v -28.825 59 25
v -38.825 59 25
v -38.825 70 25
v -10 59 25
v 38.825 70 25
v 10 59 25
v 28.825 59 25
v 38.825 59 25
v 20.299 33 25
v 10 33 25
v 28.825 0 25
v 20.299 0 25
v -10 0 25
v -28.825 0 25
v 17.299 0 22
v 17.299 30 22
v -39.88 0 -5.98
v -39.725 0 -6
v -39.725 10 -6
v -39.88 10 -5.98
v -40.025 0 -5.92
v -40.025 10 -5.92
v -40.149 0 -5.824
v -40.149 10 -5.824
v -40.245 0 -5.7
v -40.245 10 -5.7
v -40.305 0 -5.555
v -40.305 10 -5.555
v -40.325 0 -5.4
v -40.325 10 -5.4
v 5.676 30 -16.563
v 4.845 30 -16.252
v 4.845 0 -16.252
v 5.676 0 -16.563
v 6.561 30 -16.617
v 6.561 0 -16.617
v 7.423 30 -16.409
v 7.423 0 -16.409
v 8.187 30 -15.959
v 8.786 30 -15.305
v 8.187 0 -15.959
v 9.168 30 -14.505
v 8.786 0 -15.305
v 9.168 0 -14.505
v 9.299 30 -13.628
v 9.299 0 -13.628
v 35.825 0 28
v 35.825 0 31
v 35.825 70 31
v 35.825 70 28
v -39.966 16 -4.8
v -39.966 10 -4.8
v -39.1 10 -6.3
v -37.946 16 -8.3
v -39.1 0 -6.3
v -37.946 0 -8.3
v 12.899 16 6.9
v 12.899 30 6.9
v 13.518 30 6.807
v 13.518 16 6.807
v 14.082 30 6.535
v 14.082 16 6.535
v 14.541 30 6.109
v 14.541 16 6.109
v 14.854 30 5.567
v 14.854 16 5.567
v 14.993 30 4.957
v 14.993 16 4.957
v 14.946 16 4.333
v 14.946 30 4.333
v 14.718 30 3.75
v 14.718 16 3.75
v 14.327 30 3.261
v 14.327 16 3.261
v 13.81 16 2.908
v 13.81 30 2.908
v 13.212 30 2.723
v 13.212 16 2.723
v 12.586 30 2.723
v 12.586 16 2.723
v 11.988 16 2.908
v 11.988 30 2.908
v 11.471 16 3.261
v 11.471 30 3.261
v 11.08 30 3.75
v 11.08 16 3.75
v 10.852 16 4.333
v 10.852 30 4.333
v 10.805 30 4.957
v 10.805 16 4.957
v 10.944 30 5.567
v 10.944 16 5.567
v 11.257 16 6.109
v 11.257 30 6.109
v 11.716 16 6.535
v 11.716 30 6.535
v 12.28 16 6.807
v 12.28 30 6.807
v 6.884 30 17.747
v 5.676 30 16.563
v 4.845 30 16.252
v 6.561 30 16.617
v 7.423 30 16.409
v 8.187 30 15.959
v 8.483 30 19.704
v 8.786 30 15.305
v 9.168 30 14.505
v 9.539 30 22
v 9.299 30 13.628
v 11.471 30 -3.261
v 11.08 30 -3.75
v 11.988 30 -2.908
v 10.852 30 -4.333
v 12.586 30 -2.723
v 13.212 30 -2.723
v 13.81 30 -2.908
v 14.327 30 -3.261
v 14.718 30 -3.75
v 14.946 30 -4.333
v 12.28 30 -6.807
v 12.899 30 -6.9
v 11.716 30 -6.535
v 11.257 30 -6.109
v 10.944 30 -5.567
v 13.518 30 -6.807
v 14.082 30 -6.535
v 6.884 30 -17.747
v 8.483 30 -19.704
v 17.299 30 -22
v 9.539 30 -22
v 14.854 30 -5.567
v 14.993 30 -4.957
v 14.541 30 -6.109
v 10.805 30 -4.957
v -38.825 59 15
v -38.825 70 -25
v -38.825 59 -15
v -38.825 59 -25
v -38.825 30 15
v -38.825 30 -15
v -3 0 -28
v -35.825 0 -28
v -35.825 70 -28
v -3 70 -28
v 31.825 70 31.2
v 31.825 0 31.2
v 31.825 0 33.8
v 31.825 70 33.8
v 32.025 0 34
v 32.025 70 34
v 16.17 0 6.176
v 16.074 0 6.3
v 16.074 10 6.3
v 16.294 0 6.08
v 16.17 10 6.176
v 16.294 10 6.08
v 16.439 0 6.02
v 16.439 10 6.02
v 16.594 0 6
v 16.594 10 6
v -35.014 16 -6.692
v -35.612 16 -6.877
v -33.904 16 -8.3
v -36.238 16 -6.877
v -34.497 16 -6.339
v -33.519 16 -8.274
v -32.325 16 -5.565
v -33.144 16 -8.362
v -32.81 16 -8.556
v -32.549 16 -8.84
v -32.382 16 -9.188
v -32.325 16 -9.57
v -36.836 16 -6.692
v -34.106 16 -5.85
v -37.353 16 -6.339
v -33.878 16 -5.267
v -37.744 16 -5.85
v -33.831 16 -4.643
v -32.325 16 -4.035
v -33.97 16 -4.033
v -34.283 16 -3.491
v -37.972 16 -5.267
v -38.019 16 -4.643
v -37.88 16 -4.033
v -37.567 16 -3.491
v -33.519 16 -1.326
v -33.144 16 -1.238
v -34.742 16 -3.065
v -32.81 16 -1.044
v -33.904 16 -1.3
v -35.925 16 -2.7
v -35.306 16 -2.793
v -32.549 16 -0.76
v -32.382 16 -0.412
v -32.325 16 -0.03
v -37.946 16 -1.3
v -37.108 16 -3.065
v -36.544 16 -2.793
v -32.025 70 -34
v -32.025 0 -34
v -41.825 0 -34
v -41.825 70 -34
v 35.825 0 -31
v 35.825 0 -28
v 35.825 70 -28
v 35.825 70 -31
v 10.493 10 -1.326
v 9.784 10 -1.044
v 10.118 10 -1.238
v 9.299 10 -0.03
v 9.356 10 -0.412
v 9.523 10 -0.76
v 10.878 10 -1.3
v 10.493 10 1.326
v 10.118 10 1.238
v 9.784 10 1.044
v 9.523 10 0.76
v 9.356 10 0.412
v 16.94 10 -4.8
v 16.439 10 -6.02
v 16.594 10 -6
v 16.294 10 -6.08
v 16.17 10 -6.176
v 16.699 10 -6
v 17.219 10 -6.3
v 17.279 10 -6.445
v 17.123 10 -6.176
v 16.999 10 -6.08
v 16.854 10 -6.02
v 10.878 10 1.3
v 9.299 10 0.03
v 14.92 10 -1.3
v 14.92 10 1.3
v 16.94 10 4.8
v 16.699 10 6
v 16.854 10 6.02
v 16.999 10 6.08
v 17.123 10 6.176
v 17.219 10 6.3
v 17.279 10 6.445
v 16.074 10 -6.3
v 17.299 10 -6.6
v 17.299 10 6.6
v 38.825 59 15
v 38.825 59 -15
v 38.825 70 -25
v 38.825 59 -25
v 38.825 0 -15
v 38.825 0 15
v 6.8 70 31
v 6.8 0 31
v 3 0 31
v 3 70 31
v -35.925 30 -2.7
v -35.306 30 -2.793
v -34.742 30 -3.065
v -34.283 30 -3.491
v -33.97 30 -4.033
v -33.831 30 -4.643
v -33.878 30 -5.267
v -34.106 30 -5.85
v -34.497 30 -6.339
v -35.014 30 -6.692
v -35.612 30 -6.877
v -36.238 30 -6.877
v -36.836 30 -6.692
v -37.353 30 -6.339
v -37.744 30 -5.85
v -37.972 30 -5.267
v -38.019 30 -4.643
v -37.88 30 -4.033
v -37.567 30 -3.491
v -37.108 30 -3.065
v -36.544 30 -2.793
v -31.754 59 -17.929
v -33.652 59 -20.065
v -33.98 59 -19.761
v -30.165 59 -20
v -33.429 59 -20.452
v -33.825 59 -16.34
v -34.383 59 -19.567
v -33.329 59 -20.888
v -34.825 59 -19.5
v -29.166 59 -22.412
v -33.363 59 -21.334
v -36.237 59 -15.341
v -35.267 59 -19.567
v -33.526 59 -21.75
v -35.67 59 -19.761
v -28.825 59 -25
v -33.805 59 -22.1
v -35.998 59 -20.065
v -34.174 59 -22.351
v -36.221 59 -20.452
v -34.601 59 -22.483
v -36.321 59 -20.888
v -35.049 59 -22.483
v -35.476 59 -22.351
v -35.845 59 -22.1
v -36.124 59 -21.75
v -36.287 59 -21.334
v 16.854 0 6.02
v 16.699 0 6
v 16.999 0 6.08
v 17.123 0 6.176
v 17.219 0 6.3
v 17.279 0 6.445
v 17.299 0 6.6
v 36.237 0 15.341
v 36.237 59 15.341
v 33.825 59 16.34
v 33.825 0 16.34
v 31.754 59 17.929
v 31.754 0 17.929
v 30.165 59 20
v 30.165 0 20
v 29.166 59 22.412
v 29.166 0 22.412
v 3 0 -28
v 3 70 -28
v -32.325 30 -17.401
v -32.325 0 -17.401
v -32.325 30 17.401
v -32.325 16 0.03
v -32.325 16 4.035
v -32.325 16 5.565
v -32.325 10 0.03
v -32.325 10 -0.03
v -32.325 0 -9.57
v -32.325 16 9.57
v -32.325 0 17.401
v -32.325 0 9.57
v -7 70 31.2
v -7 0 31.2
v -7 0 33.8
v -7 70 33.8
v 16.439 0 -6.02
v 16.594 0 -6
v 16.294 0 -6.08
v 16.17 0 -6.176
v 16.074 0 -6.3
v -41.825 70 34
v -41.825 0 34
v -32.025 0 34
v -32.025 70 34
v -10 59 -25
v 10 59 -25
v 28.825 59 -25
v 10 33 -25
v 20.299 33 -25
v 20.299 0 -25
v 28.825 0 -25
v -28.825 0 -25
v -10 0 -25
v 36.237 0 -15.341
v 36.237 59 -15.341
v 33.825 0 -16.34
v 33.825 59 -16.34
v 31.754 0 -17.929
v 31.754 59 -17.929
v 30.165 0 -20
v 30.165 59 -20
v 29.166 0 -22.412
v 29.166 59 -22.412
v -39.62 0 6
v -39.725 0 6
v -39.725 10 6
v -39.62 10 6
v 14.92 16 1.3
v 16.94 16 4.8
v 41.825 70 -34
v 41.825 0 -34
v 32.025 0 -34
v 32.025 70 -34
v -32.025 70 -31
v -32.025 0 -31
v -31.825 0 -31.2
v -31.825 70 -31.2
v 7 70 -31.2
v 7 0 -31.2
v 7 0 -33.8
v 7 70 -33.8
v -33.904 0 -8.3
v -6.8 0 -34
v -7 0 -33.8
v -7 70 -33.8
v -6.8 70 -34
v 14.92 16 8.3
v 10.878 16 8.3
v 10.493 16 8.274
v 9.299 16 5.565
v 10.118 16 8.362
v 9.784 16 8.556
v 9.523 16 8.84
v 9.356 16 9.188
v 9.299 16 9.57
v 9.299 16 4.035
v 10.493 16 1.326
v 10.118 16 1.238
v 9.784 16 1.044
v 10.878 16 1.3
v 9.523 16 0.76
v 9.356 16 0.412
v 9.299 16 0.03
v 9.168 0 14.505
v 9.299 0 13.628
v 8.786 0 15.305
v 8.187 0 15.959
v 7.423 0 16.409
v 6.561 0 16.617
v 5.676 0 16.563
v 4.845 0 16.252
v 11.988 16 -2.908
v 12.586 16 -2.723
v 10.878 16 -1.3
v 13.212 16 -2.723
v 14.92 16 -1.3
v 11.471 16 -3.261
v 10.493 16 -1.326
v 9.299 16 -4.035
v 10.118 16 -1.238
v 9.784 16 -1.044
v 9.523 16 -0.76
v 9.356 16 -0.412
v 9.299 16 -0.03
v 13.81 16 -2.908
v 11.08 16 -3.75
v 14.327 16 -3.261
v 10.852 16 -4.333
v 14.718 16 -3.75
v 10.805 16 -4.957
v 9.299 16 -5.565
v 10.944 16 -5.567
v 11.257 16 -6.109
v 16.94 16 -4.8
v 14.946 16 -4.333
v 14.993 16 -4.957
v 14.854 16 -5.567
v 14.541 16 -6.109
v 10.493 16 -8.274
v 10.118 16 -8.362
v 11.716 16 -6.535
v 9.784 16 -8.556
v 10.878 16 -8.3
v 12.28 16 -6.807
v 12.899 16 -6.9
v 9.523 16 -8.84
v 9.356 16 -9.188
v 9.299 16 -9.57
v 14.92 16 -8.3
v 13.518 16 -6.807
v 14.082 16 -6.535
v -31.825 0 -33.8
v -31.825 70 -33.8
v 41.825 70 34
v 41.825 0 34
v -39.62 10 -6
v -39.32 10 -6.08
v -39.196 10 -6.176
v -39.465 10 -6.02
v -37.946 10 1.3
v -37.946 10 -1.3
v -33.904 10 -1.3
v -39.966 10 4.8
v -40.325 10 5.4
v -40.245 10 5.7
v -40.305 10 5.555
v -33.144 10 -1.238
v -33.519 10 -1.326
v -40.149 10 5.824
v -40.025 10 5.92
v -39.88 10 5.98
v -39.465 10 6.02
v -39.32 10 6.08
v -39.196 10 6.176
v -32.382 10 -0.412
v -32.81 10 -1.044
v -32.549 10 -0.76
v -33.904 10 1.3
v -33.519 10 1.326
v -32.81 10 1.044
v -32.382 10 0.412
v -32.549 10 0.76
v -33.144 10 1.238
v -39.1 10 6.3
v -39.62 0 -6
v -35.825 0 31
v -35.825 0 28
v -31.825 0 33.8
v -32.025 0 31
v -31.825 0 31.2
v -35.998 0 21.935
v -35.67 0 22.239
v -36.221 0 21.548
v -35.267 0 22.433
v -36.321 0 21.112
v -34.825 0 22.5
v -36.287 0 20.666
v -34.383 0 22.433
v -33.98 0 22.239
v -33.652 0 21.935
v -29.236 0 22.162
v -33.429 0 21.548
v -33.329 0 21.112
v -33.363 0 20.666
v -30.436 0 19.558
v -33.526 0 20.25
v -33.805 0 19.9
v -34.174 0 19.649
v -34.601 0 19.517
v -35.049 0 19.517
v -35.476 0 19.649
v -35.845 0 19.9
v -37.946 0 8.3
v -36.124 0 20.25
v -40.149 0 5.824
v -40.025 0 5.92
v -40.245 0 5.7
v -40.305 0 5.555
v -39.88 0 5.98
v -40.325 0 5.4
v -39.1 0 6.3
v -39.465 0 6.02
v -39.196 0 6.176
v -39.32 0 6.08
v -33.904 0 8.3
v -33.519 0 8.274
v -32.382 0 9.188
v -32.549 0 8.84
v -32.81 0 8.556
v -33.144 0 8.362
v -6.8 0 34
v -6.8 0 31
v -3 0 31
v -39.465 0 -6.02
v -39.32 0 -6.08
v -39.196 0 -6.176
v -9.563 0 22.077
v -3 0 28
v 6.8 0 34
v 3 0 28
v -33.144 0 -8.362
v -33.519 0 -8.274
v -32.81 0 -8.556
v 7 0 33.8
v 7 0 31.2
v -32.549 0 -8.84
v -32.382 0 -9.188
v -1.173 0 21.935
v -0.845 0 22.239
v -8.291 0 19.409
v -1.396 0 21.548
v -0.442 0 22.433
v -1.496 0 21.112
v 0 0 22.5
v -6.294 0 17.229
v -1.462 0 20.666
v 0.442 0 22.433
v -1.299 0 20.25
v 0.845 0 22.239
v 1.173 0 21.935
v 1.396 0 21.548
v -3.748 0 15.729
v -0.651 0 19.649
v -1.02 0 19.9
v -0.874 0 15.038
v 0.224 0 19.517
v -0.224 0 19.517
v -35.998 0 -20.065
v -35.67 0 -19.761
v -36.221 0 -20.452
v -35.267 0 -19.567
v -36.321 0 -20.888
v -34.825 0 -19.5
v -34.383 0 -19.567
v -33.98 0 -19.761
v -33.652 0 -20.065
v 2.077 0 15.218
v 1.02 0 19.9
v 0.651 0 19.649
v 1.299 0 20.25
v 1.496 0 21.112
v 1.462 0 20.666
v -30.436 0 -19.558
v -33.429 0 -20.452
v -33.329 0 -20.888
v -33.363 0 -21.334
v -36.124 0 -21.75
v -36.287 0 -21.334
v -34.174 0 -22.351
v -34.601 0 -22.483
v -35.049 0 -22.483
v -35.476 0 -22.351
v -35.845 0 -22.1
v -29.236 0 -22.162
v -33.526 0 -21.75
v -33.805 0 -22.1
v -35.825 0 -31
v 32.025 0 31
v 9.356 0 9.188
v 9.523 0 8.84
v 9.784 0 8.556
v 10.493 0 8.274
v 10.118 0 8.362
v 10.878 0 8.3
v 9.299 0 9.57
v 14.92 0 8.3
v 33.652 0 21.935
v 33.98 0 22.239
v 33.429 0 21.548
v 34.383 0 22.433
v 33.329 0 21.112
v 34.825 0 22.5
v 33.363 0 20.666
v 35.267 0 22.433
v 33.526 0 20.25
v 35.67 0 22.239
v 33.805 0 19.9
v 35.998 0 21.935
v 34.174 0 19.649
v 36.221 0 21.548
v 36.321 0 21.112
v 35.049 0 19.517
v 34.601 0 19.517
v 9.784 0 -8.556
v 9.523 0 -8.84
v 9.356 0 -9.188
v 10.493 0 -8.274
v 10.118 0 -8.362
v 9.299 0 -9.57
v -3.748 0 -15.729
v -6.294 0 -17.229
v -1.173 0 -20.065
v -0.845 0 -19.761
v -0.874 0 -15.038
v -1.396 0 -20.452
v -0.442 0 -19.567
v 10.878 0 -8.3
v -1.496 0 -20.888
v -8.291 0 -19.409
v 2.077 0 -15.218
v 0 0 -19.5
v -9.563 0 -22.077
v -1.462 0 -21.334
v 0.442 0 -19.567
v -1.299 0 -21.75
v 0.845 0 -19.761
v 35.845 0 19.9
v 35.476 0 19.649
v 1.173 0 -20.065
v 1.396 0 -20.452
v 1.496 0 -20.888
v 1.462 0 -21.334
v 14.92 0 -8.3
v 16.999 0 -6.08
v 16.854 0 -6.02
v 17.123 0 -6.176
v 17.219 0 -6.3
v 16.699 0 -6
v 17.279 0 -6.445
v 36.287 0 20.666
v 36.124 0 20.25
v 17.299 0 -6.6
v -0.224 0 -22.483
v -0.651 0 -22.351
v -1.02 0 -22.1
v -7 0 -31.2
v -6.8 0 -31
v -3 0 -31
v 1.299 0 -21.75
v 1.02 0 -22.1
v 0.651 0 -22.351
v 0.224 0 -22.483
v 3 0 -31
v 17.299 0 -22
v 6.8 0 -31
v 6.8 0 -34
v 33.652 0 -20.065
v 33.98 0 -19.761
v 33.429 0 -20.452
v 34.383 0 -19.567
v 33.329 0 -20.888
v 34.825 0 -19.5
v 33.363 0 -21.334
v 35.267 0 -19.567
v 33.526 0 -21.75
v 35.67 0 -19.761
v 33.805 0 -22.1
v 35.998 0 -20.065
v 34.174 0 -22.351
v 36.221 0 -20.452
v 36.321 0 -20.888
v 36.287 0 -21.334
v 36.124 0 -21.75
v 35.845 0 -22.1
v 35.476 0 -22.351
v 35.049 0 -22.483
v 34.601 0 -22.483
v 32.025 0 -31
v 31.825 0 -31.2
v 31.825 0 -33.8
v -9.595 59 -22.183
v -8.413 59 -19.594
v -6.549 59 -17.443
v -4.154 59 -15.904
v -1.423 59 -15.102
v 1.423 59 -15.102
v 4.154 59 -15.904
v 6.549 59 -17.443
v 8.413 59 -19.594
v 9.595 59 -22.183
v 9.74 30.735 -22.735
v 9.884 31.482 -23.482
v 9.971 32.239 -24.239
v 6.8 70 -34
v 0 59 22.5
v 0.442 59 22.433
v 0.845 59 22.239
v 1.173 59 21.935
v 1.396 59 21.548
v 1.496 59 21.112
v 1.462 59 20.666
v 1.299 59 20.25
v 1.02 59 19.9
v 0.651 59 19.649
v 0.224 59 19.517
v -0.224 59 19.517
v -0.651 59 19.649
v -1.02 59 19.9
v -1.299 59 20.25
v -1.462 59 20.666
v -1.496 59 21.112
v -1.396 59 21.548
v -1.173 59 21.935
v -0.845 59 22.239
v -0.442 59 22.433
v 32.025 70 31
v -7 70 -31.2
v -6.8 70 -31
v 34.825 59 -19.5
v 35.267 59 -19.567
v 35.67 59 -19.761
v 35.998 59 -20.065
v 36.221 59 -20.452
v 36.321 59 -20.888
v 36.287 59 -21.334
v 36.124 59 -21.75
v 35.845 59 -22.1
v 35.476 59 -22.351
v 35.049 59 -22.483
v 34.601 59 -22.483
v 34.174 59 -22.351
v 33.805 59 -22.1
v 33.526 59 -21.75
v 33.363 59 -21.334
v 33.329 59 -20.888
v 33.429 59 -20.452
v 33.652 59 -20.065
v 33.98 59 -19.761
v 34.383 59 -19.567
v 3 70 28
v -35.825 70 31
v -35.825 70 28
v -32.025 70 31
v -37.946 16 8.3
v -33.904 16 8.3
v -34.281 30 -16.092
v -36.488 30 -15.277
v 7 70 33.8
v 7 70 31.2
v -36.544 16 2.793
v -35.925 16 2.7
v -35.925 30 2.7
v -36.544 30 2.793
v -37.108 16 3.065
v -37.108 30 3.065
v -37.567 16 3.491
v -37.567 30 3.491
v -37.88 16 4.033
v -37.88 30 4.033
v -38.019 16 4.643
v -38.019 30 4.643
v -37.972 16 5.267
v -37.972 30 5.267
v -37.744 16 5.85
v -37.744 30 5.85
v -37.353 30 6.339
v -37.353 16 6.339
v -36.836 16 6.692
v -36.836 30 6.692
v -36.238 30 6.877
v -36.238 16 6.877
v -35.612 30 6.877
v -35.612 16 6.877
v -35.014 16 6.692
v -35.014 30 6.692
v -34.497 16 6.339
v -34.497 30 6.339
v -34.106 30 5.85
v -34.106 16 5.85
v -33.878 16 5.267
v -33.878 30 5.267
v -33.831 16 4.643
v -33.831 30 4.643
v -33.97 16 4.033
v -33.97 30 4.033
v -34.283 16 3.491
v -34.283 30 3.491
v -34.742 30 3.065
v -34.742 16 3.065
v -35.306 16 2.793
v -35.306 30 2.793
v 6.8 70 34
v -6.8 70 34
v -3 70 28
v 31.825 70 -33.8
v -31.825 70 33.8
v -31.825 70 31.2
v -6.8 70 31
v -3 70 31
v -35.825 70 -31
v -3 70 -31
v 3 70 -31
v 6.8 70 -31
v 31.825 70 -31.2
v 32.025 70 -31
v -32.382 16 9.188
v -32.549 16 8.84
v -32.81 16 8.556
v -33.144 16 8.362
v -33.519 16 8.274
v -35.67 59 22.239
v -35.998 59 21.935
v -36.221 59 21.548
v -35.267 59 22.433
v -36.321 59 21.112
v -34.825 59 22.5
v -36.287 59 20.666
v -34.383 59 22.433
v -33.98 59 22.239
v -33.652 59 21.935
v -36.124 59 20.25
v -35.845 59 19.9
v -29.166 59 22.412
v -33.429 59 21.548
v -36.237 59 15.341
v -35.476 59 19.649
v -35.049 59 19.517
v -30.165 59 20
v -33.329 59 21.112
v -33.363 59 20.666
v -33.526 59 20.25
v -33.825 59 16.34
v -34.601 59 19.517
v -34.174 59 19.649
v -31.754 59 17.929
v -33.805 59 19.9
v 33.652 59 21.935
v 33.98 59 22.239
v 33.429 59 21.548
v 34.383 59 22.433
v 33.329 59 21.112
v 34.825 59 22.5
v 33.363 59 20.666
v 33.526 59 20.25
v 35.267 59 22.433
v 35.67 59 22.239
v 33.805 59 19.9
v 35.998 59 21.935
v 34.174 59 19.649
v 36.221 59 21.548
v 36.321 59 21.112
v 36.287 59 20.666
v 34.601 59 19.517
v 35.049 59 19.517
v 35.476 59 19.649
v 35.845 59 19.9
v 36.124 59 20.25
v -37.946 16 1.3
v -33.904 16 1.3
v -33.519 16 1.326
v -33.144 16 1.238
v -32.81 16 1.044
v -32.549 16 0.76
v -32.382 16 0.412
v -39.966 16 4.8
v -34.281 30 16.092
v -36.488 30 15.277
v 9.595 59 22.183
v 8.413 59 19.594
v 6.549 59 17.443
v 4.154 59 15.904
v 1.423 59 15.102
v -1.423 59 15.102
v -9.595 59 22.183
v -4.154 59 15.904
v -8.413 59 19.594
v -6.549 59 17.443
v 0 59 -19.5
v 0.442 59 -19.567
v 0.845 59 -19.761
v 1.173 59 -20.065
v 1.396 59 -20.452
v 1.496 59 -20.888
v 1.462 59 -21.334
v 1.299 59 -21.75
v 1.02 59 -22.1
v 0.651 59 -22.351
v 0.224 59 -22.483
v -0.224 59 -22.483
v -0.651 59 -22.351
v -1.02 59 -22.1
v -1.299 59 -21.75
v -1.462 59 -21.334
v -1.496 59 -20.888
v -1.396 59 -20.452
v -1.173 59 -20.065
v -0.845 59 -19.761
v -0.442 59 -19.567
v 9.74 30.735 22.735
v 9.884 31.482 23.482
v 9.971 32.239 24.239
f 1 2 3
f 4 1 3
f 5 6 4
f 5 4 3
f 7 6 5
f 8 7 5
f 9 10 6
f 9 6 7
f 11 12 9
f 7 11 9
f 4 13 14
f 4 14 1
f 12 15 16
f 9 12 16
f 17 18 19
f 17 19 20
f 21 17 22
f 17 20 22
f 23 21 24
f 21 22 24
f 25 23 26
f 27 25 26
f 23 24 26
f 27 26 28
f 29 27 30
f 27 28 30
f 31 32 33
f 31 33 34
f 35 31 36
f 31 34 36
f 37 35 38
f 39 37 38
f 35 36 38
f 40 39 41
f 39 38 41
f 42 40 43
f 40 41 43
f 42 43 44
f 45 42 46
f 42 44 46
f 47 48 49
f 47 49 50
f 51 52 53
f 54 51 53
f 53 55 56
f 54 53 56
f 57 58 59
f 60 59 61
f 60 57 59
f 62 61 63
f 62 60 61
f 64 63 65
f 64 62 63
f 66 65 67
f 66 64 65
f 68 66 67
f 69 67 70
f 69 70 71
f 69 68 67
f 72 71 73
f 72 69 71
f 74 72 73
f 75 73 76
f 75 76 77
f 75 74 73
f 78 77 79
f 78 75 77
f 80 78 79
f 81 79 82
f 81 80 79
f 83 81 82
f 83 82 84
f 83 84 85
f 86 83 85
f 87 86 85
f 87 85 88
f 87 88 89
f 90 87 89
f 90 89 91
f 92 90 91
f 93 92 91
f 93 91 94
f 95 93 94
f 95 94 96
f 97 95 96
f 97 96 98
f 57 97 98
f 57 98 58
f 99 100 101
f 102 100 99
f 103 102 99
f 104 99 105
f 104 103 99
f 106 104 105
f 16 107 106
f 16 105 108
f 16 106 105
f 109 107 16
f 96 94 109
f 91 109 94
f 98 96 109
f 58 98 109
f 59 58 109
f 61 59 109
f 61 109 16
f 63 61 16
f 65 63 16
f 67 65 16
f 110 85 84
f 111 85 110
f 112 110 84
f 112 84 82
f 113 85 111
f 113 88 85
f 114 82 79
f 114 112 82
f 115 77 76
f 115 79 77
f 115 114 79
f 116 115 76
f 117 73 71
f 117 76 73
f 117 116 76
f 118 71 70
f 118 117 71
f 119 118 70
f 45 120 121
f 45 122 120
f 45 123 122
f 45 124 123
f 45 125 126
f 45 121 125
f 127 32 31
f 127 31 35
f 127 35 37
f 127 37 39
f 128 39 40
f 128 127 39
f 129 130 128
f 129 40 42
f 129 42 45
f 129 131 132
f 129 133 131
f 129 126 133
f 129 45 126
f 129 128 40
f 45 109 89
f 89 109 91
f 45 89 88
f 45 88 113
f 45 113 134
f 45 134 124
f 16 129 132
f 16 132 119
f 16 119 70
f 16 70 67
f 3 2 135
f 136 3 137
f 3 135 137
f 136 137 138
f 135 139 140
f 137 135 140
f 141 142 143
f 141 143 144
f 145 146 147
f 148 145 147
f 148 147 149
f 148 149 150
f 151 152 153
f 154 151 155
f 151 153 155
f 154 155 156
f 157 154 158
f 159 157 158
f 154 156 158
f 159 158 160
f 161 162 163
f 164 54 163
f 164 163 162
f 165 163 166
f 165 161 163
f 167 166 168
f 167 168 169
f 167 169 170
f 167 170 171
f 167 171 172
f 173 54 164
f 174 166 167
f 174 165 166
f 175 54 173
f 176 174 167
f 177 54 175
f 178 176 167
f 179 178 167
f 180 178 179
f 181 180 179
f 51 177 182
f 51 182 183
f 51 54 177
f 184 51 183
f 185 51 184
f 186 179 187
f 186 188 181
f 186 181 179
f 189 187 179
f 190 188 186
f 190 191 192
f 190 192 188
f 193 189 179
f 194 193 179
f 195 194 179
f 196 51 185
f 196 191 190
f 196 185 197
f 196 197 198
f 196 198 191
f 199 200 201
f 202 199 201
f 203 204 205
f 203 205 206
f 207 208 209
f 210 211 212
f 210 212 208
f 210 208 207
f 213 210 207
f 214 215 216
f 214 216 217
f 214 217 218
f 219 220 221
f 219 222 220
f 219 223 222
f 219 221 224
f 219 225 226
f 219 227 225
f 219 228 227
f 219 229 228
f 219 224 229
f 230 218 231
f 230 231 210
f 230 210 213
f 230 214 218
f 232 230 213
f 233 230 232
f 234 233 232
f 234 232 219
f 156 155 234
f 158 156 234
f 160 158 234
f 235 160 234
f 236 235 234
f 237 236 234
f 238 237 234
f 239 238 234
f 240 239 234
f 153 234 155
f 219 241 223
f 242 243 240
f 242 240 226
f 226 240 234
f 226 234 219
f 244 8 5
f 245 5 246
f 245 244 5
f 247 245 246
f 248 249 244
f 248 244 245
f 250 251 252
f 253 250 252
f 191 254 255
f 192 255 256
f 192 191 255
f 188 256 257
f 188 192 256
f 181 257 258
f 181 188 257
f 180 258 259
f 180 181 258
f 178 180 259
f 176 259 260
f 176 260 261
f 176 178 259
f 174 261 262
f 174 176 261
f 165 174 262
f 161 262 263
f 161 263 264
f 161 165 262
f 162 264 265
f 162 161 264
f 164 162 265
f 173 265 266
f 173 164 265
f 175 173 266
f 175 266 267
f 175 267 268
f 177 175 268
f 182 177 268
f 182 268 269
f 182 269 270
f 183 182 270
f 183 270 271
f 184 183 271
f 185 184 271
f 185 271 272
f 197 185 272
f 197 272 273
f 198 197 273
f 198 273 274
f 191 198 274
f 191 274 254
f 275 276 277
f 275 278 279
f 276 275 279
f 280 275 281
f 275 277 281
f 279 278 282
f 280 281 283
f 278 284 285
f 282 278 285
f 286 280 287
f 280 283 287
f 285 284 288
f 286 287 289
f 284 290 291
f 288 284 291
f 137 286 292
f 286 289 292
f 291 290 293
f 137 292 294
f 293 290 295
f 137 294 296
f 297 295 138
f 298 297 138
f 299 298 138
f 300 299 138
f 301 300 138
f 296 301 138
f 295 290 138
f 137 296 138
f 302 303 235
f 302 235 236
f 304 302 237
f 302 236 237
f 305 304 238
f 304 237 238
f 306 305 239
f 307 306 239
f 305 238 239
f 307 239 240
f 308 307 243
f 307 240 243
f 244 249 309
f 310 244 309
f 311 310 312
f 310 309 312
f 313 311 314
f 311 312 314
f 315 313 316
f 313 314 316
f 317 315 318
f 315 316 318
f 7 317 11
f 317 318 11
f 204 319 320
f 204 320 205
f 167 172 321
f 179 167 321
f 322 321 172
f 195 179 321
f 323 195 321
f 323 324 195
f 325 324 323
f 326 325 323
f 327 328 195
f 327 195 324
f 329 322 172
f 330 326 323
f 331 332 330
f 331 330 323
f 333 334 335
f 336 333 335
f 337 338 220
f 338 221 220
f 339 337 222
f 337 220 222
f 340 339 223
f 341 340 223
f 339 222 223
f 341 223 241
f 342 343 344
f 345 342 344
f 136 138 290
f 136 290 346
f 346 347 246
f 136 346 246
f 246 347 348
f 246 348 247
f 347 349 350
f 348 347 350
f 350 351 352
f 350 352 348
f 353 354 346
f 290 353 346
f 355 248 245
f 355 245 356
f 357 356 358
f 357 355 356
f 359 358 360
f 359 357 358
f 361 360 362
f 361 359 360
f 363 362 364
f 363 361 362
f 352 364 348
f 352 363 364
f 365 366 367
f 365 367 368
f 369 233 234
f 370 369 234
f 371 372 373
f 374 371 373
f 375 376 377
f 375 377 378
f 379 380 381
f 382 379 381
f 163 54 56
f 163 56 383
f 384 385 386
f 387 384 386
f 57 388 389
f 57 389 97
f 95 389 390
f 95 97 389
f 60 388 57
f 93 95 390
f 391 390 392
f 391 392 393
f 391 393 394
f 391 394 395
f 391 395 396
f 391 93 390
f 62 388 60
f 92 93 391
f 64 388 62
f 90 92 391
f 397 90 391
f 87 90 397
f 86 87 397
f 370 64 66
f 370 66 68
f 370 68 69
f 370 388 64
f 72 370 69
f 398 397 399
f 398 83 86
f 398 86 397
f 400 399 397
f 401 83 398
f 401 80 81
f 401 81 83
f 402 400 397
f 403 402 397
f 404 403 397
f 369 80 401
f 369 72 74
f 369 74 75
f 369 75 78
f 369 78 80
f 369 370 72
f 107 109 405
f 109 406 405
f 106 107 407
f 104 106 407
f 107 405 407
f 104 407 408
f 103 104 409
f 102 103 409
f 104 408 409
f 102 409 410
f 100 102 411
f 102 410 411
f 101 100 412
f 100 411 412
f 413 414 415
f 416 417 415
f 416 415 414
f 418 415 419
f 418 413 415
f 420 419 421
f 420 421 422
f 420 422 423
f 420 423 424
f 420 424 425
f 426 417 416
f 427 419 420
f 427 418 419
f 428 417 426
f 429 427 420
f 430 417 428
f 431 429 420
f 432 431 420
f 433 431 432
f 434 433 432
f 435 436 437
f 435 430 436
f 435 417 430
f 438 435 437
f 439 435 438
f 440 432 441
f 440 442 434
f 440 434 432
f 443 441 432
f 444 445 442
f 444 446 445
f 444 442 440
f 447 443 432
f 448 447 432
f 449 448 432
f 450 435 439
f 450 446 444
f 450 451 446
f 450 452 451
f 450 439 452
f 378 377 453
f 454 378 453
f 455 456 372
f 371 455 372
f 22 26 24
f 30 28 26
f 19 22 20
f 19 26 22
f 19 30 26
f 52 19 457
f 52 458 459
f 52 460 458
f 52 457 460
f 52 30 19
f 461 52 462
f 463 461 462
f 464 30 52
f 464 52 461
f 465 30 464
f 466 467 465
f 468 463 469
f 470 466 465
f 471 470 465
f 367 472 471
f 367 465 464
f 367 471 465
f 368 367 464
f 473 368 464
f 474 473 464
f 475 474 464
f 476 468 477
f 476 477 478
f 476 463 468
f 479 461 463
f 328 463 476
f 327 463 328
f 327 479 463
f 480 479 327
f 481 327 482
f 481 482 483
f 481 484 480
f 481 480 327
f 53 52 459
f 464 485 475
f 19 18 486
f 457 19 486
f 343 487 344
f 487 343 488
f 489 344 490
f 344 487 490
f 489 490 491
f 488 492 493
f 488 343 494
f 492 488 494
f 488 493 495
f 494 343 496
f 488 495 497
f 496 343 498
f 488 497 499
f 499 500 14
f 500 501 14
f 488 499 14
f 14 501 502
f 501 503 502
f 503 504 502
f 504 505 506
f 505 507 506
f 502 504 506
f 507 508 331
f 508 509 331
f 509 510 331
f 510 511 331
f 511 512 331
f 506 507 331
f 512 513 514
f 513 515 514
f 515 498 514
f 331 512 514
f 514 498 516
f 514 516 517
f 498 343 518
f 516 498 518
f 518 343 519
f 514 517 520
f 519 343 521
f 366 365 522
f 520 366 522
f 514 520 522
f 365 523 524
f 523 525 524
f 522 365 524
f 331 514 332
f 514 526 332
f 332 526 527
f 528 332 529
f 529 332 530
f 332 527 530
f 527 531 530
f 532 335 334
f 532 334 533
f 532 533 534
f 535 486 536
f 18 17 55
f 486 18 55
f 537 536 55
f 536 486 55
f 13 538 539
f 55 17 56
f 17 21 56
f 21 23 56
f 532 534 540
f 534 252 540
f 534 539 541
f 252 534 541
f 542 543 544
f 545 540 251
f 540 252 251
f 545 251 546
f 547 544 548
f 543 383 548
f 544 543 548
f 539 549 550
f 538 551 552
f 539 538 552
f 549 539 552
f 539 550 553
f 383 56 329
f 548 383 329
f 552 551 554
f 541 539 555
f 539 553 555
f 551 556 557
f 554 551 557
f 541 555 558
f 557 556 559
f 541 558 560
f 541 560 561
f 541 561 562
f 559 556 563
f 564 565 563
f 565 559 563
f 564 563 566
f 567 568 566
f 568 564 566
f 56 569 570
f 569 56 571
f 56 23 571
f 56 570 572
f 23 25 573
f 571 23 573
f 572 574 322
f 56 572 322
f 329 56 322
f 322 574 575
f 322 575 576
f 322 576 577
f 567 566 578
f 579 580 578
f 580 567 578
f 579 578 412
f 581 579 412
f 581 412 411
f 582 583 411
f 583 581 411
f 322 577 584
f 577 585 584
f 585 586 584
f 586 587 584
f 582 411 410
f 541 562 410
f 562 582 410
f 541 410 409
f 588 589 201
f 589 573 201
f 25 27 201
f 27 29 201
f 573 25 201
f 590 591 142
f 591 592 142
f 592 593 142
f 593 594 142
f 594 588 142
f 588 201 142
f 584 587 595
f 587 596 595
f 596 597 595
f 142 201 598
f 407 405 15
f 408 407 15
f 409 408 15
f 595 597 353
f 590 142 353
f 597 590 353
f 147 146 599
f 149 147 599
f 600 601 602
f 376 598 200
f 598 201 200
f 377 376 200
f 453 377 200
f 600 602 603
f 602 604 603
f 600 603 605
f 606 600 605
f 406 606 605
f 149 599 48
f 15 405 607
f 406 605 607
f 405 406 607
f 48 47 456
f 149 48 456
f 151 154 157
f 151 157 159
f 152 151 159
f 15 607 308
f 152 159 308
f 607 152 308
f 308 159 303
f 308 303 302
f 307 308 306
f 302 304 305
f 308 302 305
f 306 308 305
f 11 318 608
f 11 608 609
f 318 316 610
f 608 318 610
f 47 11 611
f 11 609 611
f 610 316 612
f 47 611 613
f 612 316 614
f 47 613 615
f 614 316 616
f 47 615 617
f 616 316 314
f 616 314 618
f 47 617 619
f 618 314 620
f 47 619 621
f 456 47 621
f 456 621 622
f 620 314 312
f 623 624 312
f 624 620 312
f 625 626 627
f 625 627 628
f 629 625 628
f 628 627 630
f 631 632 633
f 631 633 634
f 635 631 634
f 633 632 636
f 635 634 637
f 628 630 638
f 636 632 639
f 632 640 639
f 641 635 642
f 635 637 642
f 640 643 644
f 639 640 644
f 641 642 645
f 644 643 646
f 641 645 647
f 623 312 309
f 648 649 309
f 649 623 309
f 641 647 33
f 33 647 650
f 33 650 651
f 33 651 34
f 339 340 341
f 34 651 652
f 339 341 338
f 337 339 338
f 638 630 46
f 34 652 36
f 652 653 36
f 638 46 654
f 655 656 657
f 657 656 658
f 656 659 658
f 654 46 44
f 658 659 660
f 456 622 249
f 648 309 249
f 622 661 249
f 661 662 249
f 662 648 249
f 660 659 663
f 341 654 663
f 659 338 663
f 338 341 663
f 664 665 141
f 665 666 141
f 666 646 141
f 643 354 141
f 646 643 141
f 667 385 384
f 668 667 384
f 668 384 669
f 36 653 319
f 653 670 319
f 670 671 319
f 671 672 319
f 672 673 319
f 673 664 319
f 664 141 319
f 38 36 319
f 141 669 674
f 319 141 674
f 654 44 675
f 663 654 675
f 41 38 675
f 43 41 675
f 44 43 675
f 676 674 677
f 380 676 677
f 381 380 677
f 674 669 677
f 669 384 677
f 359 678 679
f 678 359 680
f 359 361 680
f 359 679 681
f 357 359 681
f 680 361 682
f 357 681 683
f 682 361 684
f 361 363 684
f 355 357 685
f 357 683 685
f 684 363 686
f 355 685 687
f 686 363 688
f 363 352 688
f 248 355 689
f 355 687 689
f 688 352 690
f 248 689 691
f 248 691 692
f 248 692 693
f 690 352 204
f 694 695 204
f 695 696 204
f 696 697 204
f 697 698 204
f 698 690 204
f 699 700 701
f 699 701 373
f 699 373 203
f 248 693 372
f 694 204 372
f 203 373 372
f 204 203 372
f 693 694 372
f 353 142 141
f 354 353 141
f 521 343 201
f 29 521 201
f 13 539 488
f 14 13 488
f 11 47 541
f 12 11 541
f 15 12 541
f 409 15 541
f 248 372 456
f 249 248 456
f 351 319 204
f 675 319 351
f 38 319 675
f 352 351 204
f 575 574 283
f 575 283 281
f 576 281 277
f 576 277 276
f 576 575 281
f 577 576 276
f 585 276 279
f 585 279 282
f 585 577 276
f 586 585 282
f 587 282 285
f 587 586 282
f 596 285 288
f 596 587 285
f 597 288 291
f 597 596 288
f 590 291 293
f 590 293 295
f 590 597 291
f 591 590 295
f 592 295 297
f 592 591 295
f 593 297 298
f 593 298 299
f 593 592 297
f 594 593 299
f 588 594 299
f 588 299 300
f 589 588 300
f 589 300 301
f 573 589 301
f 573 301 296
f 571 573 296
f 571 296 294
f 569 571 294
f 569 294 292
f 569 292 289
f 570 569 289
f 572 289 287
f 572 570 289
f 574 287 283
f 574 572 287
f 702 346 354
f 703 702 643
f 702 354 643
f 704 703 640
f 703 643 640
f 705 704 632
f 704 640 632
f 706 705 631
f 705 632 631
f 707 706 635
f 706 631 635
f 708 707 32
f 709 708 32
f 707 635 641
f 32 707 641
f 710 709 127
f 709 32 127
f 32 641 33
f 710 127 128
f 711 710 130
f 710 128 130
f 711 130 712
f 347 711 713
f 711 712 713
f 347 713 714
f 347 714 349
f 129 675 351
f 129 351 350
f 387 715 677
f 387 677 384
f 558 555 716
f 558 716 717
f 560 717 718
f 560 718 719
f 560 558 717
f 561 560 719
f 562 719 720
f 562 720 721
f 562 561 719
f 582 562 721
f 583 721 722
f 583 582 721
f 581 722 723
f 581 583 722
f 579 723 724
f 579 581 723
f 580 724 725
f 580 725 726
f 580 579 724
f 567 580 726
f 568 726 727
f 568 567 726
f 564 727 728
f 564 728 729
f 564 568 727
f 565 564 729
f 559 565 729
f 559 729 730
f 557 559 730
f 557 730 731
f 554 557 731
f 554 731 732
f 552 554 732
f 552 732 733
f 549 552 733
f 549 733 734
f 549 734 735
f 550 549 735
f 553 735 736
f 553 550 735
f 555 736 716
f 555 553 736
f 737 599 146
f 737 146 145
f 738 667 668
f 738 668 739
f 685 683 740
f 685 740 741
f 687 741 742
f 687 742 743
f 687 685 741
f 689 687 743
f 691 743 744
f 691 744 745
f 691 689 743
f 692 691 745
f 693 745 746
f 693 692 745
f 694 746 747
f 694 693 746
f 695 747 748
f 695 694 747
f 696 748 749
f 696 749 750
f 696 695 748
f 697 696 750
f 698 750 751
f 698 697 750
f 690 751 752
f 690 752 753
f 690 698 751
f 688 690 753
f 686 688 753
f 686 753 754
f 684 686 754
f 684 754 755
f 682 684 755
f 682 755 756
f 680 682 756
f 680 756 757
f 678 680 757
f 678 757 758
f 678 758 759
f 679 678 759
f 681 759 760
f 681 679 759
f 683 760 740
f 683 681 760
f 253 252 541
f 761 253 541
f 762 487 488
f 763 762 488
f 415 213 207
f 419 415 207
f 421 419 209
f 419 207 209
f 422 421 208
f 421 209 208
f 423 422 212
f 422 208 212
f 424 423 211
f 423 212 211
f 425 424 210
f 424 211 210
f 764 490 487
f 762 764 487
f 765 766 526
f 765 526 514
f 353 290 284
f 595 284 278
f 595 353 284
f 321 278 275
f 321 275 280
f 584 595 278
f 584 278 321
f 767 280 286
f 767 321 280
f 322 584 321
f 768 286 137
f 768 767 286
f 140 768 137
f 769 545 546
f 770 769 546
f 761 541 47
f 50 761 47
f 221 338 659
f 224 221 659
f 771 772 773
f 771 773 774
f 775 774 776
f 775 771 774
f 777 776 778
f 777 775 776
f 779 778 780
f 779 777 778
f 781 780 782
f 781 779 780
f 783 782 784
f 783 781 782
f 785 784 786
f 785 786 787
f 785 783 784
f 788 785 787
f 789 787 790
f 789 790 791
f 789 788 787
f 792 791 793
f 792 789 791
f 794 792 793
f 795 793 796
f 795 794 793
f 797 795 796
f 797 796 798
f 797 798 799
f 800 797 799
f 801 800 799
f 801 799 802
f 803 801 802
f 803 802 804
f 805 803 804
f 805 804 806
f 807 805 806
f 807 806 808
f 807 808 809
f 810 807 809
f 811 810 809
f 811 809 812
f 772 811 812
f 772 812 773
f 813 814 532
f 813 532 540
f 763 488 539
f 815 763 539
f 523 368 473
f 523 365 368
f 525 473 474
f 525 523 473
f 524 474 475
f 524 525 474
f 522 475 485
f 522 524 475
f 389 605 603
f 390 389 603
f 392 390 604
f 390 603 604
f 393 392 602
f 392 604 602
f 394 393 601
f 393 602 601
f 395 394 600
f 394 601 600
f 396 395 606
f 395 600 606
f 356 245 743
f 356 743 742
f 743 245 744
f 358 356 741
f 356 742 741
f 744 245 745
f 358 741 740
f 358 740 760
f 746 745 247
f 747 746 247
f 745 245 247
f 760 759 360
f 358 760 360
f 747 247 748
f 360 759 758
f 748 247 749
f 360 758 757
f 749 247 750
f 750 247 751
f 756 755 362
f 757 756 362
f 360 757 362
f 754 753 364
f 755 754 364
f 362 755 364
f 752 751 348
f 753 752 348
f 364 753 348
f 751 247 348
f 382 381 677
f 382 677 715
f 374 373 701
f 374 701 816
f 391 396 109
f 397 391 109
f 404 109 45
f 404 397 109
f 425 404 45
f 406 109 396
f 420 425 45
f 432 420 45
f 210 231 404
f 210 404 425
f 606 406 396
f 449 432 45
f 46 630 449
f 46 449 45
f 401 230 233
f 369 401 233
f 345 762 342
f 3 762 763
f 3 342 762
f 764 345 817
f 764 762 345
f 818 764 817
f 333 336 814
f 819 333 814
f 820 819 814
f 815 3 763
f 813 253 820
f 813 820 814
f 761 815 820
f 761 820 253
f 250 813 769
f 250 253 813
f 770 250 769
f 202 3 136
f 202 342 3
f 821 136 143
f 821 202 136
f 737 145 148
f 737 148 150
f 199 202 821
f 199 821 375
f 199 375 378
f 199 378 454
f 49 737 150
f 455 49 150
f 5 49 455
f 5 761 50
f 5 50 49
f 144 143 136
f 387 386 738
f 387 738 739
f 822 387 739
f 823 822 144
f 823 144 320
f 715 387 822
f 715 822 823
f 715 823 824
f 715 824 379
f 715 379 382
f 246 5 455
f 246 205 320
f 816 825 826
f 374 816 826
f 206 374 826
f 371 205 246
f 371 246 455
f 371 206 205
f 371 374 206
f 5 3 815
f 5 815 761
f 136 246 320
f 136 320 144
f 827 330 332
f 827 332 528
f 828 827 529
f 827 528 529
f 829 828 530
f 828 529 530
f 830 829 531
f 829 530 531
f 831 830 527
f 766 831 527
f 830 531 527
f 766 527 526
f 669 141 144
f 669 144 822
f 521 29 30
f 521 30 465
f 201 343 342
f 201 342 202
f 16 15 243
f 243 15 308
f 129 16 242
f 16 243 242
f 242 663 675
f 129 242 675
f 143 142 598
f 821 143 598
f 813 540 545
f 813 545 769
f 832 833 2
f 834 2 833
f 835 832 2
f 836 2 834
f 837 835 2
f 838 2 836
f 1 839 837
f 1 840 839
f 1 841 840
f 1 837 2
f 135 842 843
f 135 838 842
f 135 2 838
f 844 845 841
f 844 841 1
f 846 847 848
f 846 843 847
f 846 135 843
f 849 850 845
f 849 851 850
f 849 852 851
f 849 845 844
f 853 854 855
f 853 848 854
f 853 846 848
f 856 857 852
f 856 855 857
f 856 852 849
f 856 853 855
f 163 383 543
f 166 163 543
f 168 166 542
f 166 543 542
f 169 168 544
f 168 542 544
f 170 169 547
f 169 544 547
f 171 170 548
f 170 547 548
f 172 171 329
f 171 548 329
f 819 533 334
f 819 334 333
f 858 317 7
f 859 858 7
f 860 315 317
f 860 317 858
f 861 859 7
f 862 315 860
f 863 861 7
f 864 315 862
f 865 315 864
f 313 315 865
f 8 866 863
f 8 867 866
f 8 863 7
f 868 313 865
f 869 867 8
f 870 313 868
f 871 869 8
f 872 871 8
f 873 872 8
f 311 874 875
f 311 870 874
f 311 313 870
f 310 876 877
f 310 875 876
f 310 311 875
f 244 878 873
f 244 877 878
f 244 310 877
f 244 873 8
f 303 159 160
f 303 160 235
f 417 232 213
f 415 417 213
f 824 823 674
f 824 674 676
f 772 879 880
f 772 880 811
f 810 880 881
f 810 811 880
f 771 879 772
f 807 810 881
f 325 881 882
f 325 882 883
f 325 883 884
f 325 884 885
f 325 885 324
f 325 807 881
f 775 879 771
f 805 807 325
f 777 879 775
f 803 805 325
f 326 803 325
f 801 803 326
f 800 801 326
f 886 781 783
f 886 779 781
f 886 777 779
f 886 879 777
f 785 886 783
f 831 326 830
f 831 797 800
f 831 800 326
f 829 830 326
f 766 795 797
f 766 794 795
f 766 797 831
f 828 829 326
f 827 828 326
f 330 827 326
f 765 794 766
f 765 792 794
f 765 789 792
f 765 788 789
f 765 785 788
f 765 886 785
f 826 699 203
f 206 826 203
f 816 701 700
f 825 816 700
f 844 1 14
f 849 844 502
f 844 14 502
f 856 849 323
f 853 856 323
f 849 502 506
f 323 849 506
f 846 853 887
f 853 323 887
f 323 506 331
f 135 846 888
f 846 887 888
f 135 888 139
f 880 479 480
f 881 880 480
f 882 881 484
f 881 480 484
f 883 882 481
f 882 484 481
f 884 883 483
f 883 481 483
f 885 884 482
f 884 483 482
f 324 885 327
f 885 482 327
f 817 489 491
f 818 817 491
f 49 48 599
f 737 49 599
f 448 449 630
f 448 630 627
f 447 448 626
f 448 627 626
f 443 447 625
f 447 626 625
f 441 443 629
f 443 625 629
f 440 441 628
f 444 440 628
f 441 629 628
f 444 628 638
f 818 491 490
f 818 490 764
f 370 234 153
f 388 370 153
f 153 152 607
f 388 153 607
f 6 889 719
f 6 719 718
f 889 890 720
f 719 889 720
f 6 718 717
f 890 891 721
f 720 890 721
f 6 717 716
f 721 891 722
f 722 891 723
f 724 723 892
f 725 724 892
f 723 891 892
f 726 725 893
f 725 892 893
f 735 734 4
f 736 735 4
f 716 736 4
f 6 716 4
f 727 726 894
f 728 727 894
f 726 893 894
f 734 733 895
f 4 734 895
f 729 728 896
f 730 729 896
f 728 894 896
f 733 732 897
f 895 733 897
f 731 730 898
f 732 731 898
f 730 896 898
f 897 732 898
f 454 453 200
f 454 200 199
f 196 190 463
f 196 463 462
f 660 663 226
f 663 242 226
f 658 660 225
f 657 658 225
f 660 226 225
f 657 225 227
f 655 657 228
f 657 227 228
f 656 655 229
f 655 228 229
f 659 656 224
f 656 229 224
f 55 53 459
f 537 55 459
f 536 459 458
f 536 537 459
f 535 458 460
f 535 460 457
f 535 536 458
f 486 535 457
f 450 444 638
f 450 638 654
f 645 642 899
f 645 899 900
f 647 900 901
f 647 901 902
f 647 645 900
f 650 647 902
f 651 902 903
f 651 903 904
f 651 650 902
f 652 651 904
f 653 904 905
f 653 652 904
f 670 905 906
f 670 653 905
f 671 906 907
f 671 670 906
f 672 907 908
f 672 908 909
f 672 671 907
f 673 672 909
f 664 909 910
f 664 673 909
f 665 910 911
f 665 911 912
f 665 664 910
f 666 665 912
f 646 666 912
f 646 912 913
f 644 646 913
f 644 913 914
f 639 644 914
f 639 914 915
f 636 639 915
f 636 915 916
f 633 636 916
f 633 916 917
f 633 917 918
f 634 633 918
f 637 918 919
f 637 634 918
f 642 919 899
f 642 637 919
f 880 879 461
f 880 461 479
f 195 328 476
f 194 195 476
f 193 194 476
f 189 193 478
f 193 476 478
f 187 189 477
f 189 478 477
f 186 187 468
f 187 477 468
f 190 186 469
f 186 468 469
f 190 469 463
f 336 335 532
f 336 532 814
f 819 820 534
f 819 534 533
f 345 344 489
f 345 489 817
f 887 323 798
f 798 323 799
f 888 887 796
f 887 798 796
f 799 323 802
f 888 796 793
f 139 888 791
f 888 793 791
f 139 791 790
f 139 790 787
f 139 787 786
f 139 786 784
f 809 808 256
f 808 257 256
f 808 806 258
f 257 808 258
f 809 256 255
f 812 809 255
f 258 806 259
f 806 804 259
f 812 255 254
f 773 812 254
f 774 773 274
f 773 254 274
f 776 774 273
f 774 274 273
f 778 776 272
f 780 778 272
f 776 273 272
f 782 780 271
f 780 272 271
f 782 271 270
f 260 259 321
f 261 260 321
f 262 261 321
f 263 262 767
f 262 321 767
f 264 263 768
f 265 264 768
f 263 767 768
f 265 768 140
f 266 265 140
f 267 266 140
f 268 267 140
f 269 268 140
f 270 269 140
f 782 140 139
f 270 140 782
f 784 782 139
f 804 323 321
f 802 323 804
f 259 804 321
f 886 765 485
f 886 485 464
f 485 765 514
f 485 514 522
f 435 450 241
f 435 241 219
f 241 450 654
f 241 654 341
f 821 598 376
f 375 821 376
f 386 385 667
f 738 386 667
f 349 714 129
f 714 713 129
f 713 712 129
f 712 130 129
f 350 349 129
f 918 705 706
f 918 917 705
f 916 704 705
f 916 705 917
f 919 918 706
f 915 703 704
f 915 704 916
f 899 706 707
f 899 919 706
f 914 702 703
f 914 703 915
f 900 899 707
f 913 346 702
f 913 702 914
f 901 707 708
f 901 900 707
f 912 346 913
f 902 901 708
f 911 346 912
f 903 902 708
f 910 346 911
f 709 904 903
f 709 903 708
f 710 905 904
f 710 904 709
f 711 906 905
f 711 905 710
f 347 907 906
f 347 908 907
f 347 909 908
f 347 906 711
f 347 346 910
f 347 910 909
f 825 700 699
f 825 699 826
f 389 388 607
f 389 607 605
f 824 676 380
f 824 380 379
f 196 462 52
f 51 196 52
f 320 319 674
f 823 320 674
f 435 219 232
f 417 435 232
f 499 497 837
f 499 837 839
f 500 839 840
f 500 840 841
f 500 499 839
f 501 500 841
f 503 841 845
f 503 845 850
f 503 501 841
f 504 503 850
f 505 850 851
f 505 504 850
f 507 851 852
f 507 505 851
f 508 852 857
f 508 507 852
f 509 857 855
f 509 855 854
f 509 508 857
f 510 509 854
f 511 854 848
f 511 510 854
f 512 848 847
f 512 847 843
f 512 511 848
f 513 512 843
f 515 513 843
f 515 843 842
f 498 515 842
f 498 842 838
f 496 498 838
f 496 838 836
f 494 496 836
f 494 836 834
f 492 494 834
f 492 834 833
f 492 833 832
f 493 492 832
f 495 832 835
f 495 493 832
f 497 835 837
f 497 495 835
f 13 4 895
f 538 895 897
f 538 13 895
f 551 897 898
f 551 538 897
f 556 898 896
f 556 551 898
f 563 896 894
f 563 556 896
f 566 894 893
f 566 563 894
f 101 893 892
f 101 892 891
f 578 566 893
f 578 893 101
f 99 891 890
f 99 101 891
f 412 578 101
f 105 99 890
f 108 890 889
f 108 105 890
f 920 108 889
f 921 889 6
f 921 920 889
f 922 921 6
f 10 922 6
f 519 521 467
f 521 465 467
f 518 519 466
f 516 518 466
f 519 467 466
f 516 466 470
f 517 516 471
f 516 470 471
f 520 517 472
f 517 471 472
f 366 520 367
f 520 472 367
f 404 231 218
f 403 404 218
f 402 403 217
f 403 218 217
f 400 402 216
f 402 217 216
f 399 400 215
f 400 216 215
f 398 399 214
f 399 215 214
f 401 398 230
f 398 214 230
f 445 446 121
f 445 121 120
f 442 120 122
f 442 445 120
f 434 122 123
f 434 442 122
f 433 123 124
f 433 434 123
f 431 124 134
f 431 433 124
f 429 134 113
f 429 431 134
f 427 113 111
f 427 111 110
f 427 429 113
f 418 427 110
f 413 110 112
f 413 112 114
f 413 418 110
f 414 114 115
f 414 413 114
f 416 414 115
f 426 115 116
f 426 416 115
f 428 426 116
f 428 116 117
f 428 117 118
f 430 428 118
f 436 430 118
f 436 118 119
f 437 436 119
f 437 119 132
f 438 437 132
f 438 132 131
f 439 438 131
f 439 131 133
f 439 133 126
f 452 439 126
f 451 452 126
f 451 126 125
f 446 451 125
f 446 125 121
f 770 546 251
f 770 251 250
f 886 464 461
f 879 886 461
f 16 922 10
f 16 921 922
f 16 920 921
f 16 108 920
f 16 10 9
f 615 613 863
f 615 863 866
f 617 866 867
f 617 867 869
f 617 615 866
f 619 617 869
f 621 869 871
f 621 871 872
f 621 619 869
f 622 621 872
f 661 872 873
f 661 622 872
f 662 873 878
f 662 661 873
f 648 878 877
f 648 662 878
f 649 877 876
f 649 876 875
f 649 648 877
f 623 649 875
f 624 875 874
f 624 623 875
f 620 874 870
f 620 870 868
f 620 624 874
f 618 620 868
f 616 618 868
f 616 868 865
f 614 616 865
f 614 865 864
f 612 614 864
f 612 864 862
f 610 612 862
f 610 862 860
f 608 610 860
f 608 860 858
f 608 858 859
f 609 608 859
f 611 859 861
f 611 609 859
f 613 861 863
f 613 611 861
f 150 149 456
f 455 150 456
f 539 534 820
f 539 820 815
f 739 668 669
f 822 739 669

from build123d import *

# Parameters (mm, degrees)
SKETCH1_R             = 1.5
BOSS_EXTRUDE6_DEPTH   = 59
BOSS_EXTRUDE6_2_DEPTH = 59
BOSS_EXTRUDE6_3_DEPTH = 59
BOSS_EXTRUDE6_4_DEPTH = 59
BOSS_EXTRUDE6_5_DEPTH = 59
BOSS_EXTRUDE6_6_DEPTH = 59
SKETCH2_W             = 83.65
SKETCH2_H             = 56
SKETCH2_W_2           = 77.65
SKETCH2_H_2           = 50
BOSS_EXTRUDE7_DEPTH   = 70
SKETCH3_R             = 2.1
SKETCH3_W             = 8
SKETCH3_H             = 50
BOSS_EXTRUDE8_DEPTH   = 30
CHAMFER1_SIZE         = 3
FILLET1_R             = 3
SKETCH4_R             = 2.1
CUT_EXTRUDE2_DEPTH    = 16
FILLET2_R             = 1.3
SKETCH5_W             = 8.8
SKETCH5_H             = 12
CUT_EXTRUDE3_DEPTH    = 10
FILLET3_R             = 0.6
SKETCH6_W             = 6
SKETCH6_H             = 6
BOSS_EXTRUDE9_DEPTH   = 70
CHAMFER3_SIZE         = 0.2


with BuildPart() as part:
    # Sketch1 → Boss-Extrude6 (new body)
    with BuildSketch(Plane(origin=(0, 0, 0), x_dir=(1, 0, 0), z_dir=(0, 1, 0))):
        with BuildLine():
            Line((-38.825, 15), (-38.825, 25))
            Line((-38.825, 25), (-28.825, 25))
            ThreePointArc((-28.825, 25), (-31.753932188, 17.928932188), (-38.825, 15))
        make_face()
        with Locations(Location((-34.825, 21, 0), (0, 0, 270))):
            Circle(SKETCH1_R, mode=Mode.SUBTRACT)
    extrude(amount=BOSS_EXTRUDE6_DEPTH)



with BuildPart() as body_2:
    # Sketch1 → Boss-Extrude6 2 (new body)
    with BuildSketch(Plane(origin=(0, 0, 0), x_dir=(1, 0, 0), z_dir=(0, 1, 0))):
        with BuildLine():
            Line((-38.825, -25), (-28.825, -25))
            ThreePointArc((-28.825, -25), (-31.753932188, -17.928932188), (-38.825, -15))
            Line((-38.825, -15), (-38.825, -25))
        make_face()
        with Locations(Location((-34.825, -21, 0), (0, 0, 270))):
            Circle(SKETCH1_R, mode=Mode.SUBTRACT)
    extrude(amount=BOSS_EXTRUDE6_2_DEPTH)


with BuildPart() as body_3:
    # Sketch1 → Boss-Extrude6 3 (new body)
    with BuildSketch(Plane(origin=(0, 0, 0), x_dir=(1, 0, 0), z_dir=(0, 1, 0))):
        with BuildLine():
            Line((38.825, -25), (38.825, -15))
            ThreePointArc((38.825, -15), (31.753932188, -17.928932188), (28.825, -25))
            Line((28.825, -25), (38.825, -25))
        make_face()
        with Locations(Location((34.825, -21, 0), (0, 0, 270))):
            Circle(SKETCH1_R, mode=Mode.SUBTRACT)
    extrude(amount=BOSS_EXTRUDE6_3_DEPTH)


with BuildPart() as body_4:
    # Sketch1 → Boss-Extrude6 4 (new body)
    with BuildSketch(Plane(origin=(0, 0, 0), x_dir=(1, 0, 0), z_dir=(0, 1, 0))):
        with BuildLine():
            Line((28.825, 25), (38.825, 25))
            Line((38.825, 25), (38.825, 15))
            ThreePointArc((38.825, 15), (31.753932188, 17.928932188), (28.825, 25))
        make_face()
        with Locations(Location((34.825, 21, 0), (0, 0, 270))):
            Circle(SKETCH1_R, mode=Mode.SUBTRACT)
    extrude(amount=BOSS_EXTRUDE6_4_DEPTH)


with BuildPart() as body_5:
    # Sketch1 → Boss-Extrude6 5 (new body)
    with BuildSketch(Plane(origin=(0, 0, 0), x_dir=(1, 0, 0), z_dir=(0, 1, 0))):
        with BuildLine():
            Line((10, -25), (-10, -25))
            ThreePointArc((-10, -25), (0, -15), (10, -25))
        make_face()
        with Locations(Location((0, -21, 0), (0, 0, 270))):
            Circle(SKETCH1_R, mode=Mode.SUBTRACT)
    extrude(amount=BOSS_EXTRUDE6_5_DEPTH)


with BuildPart() as body_6:
    # Sketch1 → Boss-Extrude6 6 (new body)
    with BuildSketch(Plane(origin=(0, 0, 0), x_dir=(1, 0, 0), z_dir=(0, 1, 0))):
        with BuildLine():
            Line((10, 25), (-10, 25))
            ThreePointArc((-10, 25), (0, 15), (10, 25))
        make_face()
        with Locations(Location((0, 21, 0), (0, 0, 270))):
            Circle(SKETCH1_R, mode=Mode.SUBTRACT)
    extrude(amount=BOSS_EXTRUDE6_6_DEPTH)


with BuildPart() as part_1:
    add(part.part)

    add(body_2.part)  # Boss-Extrude7 merges body 2

    add(body_3.part)  # Boss-Extrude7 merges body 3

    add(body_4.part)  # Boss-Extrude7 merges body 4

    add(body_5.part)  # Boss-Extrude7 merges body 5

    add(body_6.part)  # Boss-Extrude7 merges body 6
    # Sketch2 → Boss-Extrude7 (add)
    with BuildSketch(Plane(origin=(0, 0, 0), x_dir=(1, 0, 0), z_dir=(0, 1, 0))):
        Rectangle(SKETCH2_W, SKETCH2_H)
        Rectangle(SKETCH2_W_2, SKETCH2_H_2, mode=Mode.SUBTRACT)
    extrude(amount=BOSS_EXTRUDE7_DEPTH)

    # Sketch3 → Boss-Extrude8 (add)
    # profile 1 of 2: a face of its own
    with BuildSketch(Plane(origin=(0, 0, 0), x_dir=(1, 0, 0), z_dir=(0, 1, 0))):
        Polygon((-38.825, 0), (-38.825, 19), (-32.325, 19), (-32.325, -19), (-38.825, -19), align=None)
        with Locations(Location((-35.925, 4.8, 0), (0, 0, 270))):
            Circle(SKETCH3_R, mode=Mode.SUBTRACT)
        with Locations(Location((-35.925, -4.8, 0), (0, 0, 90))):
            Circle(SKETCH3_R, mode=Mode.SUBTRACT)
    # profile 2 of 2: a face of its own
    with BuildSketch(Plane(origin=(0, 0, 0), x_dir=(1, 0, 0), z_dir=(0, 1, 0))):
        with Locations((13.299000327, 0)):
            Rectangle(SKETCH3_W, SKETCH3_H)
        with Locations(Location((12.899000327, -4.8, 0), (0, 0, 270))):
            Circle(SKETCH3_R, mode=Mode.SUBTRACT)
        with Locations(Location((12.899000327, 4.8, 0), (0, 0, 90))):
            Circle(SKETCH3_R, mode=Mode.SUBTRACT)
    extrude(amount=BOSS_EXTRUDE8_DEPTH)

    # Chamfer1
    chamfer1_edges = [part_1.edges().sort_by_distance(p)[0] for p in [
        (13.649500163, 30, 25),
        (13.649500163, 30, -25),
        (17.299000327, 15, -25),
        (17.299000327, 15, 25),
    ]]
    chamfer(chamfer1_edges, length=CHAMFER1_SIZE)

    # Fillet1
    fillet1_edges = [part_1.edges().sort_by_distance(p)[0] for p in [
        (9.299000327, 15, -21.32187644),
        (9.299000327, 15, 21.32187644),
    ]]
    fillet(fillet1_edges, radius=FILLET1_R)

    # Sketch4 → Cut-Extrude2 (cut)
    # profile 1 of 4: a face of its own
    with BuildSketch(Plane.XZ):
        Polygon((-32.325, 4.035382907), (-32.325, 5.564617093), (-33.904274058, 8.3), (-37.945725942, 8.3), (-39.966451884, 4.8), (-37.945725942, 1.3), (-33.904274058, 1.3), align=None)
        with Locations(Location((-35.925, 4.8, 0), (0, 0, 270))):
            Circle(SKETCH4_R, mode=Mode.SUBTRACT)
    # profile 2 of 4: a face of its own
    with BuildSketch(Plane.XZ):
        Polygon((-32.325, -5.564617093), (-32.325, -4.035382907), (-33.904274058, -1.3), (-37.945725942, -1.3), (-39.966451884, -4.8), (-37.945725942, -8.3), (-33.904274058, -8.3), align=None)
        with Locations(Location((-35.925, -4.8, 0), (0, 0, 270))):
            Circle(SKETCH4_R, mode=Mode.SUBTRACT)
    # profile 3 of 4: a face of its own
    with BuildSketch(Plane.XZ):
        Polygon((10.878274385, -1.3), (9.299000327, -4.035382907), (9.299000327, -5.564617093), (10.878274385, -8.3), (14.919726269, -8.3), (16.940452211, -4.8), (14.919726269, -1.3), align=None)
        with Locations(Location((12.899000327, -4.8, 0), (0, 0, 270))):
            Circle(SKETCH4_R, mode=Mode.SUBTRACT)
    # profile 4 of 4: a face of its own
    with BuildSketch(Plane.XZ):
        Polygon((14.919726269, 1.3), (16.940452211, 4.8), (14.919726269, 8.3), (10.878274385, 8.3), (9.299000327, 5.564617093), (9.299000327, 4.035382907), (10.878274385, 1.3), align=None)
        with Locations(Location((12.899000327, 4.8, 0), (0, 0, 270))):
            Circle(SKETCH4_R, mode=Mode.SUBTRACT)
    extrude(amount=-CUT_EXTRUDE2_DEPTH, mode=Mode.SUBTRACT)

    # Fillet2
    # the kernel refuses this fillet: 1.3 mm, written as the material it takes off along each edge
    with BuildSketch(Plane(origin=(9.299000327, -10.012577226, -5.564617093), x_dir=(0.5000000000000003, 0, -0.8660254037844384), z_dir=(0, 1, 0)), Plane(origin=(9.299000327, -10.012577226, 4.035382907), x_dir=(0.5000000000000006, 0, -0.8660254037844383), z_dir=(0, 1, 0)), Plane(origin=(-32.325, -10.012577226, 5.564617093), x_dir=(-0.4999999999999981, 0, 0.8660254037844398), z_dir=(0, 1, 0)), Plane(origin=(-32.325, -10.012577226, -4.035382907), x_dir=(-0.5000000000000001, 0, 0.8660254037844386), z_dir=(0, 1, 0))) as fillet2_piece_1:
        with BuildLine():
            CenterArc((4.118458494, 0.87668242), FILLET2_R, 120, 102.405330947)
            Line((3.468458494, 2.002515445), (0, 0))
            Line((0, 0), (3.158548116, 0))
        make_face()
    extrude(amount=26.012577226, mode=Mode.SUBTRACT)
    with BuildSketch(Plane(origin=(9.299000327, -10.012577226, -4.035382907), x_dir=(0.4999999999999997, 0, 0.8660254037844388), z_dir=(0, 1, 0)), Plane(origin=(9.299000327, -10.012577226, 5.564617093), x_dir=(0.49999999999999944, 0, 0.866025403784439), z_dir=(0, 1, 0)), Plane(origin=(-32.325, -10.012577226, -5.564617093), x_dir=(-0.5000000000000004, 0, -0.8660254037844384), z_dir=(0, 1, 0)), Plane(origin=(-32.325, -10.012577226, 4.035382907), x_dir=(-0.5000000000000004, 0, -0.8660254037844383), z_dir=(0, 1, 0))) as fillet2_piece_2:
        with BuildLine():
            CenterArc((4.118458494, -0.87668242), FILLET2_R, 137.594669053, 102.405330947)
            Line((3.468458494, -2.002515445), (0, 0))
            Line((0, 0), (3.158548116, 0))
        make_face()
    extrude(amount=26.012577226, mode=Mode.SUBTRACT)

    # Sketch5 → Cut-Extrude3 (cut)
    with BuildSketch(Plane.XZ):
        with Locations((12.899000327, 0)):
            Rectangle(SKETCH5_W, SKETCH5_H)
        with Locations((-35.925, 0)):
            Rectangle(SKETCH5_W, SKETCH5_H)
    extrude(amount=-CUT_EXTRUDE3_DEPTH, mode=Mode.SUBTRACT)

    # Fillet3
    fillet3_edges = [part_1.edges().sort_by_distance(p)[0] for p in [
        (16.247631888, 5, 6),
        (16.247631888, 5, -6),
        (17.299000327, 5, -6),
        (17.299000327, 5, 6),
        (-39.273631561, 5, -6),
        (-39.273631561, 5, 6),
        (-40.325, 5, 6),
        (-40.325, 5, -6),
    ]]
    fillet(fillet3_edges, radius=FILLET3_R)

    # Sketch6 → Boss-Extrude9 (add)
    with BuildSketch(Plane(origin=(0, 0, 0), x_dir=(1, 0, 0), z_dir=(0, 1, 0))):
        Polygon((-7, 31), (-3, 31), (3, 31), (7, 31), (7, 34), (-7, 34), align=None)
        with Locations((0, 28)):
            Rectangle(SKETCH6_W, SKETCH6_H)
        with Locations((-38.825, 28)):
            Rectangle(SKETCH6_W, SKETCH6_H)
        Polygon((-41.825, 31), (-35.825, 31), (-31.825, 31), (-31.825, 34), (-41.825, 34), align=None)
        Polygon((41.825, 31), (41.825, 34), (31.825, 34), (31.825, 31), (35.825, 31), align=None)
        with Locations((38.825, 28)):
            Rectangle(SKETCH6_W, SKETCH6_H)
        with Locations((38.825, -28)):
            Rectangle(SKETCH6_W, SKETCH6_H)
        Polygon((41.825, -31), (35.825, -31), (31.825, -31), (31.825, -34), (41.825, -34), align=None)
        Polygon((-41.825, -31), (-41.825, -34), (-31.825, -34), (-31.825, -31), (-35.825, -31), align=None)
        with Locations((-38.825, -28)):
            Rectangle(SKETCH6_W, SKETCH6_H)
        Polygon((-7, -34), (7, -34), (7, -31), (3, -31), (-3, -31), (-7, -31), align=None)
        with Locations((0, -28)):
            Rectangle(SKETCH6_W, SKETCH6_H)
    extrude(amount=BOSS_EXTRUDE9_DEPTH)

    # Chamfer3
    chamfer3_edges = [part_1.edges().sort_by_distance(p)[0] for p in [
        (-31.825, 35, 31),
        (-31.825, 35, 34),
        (31.825, 35, 34),
        (31.825, 35, 31),
        (-31.825, 35, -34),
        (-31.825, 35, -31),
        (-7, 35, -31),
        (-7, 35, -34),
        (7, 35, -34),
        (7, 35, -31),
        (31.825, 35, -34),
        (31.825, 35, -31),
        (-7, 35, 34),
        (7, 35, 34),
        (-7, 35, 31),
        (7, 35, 31),
    ]]
    chamfer(chamfer3_edges, length=CHAMFER3_SIZE)


solid = part_1.part
